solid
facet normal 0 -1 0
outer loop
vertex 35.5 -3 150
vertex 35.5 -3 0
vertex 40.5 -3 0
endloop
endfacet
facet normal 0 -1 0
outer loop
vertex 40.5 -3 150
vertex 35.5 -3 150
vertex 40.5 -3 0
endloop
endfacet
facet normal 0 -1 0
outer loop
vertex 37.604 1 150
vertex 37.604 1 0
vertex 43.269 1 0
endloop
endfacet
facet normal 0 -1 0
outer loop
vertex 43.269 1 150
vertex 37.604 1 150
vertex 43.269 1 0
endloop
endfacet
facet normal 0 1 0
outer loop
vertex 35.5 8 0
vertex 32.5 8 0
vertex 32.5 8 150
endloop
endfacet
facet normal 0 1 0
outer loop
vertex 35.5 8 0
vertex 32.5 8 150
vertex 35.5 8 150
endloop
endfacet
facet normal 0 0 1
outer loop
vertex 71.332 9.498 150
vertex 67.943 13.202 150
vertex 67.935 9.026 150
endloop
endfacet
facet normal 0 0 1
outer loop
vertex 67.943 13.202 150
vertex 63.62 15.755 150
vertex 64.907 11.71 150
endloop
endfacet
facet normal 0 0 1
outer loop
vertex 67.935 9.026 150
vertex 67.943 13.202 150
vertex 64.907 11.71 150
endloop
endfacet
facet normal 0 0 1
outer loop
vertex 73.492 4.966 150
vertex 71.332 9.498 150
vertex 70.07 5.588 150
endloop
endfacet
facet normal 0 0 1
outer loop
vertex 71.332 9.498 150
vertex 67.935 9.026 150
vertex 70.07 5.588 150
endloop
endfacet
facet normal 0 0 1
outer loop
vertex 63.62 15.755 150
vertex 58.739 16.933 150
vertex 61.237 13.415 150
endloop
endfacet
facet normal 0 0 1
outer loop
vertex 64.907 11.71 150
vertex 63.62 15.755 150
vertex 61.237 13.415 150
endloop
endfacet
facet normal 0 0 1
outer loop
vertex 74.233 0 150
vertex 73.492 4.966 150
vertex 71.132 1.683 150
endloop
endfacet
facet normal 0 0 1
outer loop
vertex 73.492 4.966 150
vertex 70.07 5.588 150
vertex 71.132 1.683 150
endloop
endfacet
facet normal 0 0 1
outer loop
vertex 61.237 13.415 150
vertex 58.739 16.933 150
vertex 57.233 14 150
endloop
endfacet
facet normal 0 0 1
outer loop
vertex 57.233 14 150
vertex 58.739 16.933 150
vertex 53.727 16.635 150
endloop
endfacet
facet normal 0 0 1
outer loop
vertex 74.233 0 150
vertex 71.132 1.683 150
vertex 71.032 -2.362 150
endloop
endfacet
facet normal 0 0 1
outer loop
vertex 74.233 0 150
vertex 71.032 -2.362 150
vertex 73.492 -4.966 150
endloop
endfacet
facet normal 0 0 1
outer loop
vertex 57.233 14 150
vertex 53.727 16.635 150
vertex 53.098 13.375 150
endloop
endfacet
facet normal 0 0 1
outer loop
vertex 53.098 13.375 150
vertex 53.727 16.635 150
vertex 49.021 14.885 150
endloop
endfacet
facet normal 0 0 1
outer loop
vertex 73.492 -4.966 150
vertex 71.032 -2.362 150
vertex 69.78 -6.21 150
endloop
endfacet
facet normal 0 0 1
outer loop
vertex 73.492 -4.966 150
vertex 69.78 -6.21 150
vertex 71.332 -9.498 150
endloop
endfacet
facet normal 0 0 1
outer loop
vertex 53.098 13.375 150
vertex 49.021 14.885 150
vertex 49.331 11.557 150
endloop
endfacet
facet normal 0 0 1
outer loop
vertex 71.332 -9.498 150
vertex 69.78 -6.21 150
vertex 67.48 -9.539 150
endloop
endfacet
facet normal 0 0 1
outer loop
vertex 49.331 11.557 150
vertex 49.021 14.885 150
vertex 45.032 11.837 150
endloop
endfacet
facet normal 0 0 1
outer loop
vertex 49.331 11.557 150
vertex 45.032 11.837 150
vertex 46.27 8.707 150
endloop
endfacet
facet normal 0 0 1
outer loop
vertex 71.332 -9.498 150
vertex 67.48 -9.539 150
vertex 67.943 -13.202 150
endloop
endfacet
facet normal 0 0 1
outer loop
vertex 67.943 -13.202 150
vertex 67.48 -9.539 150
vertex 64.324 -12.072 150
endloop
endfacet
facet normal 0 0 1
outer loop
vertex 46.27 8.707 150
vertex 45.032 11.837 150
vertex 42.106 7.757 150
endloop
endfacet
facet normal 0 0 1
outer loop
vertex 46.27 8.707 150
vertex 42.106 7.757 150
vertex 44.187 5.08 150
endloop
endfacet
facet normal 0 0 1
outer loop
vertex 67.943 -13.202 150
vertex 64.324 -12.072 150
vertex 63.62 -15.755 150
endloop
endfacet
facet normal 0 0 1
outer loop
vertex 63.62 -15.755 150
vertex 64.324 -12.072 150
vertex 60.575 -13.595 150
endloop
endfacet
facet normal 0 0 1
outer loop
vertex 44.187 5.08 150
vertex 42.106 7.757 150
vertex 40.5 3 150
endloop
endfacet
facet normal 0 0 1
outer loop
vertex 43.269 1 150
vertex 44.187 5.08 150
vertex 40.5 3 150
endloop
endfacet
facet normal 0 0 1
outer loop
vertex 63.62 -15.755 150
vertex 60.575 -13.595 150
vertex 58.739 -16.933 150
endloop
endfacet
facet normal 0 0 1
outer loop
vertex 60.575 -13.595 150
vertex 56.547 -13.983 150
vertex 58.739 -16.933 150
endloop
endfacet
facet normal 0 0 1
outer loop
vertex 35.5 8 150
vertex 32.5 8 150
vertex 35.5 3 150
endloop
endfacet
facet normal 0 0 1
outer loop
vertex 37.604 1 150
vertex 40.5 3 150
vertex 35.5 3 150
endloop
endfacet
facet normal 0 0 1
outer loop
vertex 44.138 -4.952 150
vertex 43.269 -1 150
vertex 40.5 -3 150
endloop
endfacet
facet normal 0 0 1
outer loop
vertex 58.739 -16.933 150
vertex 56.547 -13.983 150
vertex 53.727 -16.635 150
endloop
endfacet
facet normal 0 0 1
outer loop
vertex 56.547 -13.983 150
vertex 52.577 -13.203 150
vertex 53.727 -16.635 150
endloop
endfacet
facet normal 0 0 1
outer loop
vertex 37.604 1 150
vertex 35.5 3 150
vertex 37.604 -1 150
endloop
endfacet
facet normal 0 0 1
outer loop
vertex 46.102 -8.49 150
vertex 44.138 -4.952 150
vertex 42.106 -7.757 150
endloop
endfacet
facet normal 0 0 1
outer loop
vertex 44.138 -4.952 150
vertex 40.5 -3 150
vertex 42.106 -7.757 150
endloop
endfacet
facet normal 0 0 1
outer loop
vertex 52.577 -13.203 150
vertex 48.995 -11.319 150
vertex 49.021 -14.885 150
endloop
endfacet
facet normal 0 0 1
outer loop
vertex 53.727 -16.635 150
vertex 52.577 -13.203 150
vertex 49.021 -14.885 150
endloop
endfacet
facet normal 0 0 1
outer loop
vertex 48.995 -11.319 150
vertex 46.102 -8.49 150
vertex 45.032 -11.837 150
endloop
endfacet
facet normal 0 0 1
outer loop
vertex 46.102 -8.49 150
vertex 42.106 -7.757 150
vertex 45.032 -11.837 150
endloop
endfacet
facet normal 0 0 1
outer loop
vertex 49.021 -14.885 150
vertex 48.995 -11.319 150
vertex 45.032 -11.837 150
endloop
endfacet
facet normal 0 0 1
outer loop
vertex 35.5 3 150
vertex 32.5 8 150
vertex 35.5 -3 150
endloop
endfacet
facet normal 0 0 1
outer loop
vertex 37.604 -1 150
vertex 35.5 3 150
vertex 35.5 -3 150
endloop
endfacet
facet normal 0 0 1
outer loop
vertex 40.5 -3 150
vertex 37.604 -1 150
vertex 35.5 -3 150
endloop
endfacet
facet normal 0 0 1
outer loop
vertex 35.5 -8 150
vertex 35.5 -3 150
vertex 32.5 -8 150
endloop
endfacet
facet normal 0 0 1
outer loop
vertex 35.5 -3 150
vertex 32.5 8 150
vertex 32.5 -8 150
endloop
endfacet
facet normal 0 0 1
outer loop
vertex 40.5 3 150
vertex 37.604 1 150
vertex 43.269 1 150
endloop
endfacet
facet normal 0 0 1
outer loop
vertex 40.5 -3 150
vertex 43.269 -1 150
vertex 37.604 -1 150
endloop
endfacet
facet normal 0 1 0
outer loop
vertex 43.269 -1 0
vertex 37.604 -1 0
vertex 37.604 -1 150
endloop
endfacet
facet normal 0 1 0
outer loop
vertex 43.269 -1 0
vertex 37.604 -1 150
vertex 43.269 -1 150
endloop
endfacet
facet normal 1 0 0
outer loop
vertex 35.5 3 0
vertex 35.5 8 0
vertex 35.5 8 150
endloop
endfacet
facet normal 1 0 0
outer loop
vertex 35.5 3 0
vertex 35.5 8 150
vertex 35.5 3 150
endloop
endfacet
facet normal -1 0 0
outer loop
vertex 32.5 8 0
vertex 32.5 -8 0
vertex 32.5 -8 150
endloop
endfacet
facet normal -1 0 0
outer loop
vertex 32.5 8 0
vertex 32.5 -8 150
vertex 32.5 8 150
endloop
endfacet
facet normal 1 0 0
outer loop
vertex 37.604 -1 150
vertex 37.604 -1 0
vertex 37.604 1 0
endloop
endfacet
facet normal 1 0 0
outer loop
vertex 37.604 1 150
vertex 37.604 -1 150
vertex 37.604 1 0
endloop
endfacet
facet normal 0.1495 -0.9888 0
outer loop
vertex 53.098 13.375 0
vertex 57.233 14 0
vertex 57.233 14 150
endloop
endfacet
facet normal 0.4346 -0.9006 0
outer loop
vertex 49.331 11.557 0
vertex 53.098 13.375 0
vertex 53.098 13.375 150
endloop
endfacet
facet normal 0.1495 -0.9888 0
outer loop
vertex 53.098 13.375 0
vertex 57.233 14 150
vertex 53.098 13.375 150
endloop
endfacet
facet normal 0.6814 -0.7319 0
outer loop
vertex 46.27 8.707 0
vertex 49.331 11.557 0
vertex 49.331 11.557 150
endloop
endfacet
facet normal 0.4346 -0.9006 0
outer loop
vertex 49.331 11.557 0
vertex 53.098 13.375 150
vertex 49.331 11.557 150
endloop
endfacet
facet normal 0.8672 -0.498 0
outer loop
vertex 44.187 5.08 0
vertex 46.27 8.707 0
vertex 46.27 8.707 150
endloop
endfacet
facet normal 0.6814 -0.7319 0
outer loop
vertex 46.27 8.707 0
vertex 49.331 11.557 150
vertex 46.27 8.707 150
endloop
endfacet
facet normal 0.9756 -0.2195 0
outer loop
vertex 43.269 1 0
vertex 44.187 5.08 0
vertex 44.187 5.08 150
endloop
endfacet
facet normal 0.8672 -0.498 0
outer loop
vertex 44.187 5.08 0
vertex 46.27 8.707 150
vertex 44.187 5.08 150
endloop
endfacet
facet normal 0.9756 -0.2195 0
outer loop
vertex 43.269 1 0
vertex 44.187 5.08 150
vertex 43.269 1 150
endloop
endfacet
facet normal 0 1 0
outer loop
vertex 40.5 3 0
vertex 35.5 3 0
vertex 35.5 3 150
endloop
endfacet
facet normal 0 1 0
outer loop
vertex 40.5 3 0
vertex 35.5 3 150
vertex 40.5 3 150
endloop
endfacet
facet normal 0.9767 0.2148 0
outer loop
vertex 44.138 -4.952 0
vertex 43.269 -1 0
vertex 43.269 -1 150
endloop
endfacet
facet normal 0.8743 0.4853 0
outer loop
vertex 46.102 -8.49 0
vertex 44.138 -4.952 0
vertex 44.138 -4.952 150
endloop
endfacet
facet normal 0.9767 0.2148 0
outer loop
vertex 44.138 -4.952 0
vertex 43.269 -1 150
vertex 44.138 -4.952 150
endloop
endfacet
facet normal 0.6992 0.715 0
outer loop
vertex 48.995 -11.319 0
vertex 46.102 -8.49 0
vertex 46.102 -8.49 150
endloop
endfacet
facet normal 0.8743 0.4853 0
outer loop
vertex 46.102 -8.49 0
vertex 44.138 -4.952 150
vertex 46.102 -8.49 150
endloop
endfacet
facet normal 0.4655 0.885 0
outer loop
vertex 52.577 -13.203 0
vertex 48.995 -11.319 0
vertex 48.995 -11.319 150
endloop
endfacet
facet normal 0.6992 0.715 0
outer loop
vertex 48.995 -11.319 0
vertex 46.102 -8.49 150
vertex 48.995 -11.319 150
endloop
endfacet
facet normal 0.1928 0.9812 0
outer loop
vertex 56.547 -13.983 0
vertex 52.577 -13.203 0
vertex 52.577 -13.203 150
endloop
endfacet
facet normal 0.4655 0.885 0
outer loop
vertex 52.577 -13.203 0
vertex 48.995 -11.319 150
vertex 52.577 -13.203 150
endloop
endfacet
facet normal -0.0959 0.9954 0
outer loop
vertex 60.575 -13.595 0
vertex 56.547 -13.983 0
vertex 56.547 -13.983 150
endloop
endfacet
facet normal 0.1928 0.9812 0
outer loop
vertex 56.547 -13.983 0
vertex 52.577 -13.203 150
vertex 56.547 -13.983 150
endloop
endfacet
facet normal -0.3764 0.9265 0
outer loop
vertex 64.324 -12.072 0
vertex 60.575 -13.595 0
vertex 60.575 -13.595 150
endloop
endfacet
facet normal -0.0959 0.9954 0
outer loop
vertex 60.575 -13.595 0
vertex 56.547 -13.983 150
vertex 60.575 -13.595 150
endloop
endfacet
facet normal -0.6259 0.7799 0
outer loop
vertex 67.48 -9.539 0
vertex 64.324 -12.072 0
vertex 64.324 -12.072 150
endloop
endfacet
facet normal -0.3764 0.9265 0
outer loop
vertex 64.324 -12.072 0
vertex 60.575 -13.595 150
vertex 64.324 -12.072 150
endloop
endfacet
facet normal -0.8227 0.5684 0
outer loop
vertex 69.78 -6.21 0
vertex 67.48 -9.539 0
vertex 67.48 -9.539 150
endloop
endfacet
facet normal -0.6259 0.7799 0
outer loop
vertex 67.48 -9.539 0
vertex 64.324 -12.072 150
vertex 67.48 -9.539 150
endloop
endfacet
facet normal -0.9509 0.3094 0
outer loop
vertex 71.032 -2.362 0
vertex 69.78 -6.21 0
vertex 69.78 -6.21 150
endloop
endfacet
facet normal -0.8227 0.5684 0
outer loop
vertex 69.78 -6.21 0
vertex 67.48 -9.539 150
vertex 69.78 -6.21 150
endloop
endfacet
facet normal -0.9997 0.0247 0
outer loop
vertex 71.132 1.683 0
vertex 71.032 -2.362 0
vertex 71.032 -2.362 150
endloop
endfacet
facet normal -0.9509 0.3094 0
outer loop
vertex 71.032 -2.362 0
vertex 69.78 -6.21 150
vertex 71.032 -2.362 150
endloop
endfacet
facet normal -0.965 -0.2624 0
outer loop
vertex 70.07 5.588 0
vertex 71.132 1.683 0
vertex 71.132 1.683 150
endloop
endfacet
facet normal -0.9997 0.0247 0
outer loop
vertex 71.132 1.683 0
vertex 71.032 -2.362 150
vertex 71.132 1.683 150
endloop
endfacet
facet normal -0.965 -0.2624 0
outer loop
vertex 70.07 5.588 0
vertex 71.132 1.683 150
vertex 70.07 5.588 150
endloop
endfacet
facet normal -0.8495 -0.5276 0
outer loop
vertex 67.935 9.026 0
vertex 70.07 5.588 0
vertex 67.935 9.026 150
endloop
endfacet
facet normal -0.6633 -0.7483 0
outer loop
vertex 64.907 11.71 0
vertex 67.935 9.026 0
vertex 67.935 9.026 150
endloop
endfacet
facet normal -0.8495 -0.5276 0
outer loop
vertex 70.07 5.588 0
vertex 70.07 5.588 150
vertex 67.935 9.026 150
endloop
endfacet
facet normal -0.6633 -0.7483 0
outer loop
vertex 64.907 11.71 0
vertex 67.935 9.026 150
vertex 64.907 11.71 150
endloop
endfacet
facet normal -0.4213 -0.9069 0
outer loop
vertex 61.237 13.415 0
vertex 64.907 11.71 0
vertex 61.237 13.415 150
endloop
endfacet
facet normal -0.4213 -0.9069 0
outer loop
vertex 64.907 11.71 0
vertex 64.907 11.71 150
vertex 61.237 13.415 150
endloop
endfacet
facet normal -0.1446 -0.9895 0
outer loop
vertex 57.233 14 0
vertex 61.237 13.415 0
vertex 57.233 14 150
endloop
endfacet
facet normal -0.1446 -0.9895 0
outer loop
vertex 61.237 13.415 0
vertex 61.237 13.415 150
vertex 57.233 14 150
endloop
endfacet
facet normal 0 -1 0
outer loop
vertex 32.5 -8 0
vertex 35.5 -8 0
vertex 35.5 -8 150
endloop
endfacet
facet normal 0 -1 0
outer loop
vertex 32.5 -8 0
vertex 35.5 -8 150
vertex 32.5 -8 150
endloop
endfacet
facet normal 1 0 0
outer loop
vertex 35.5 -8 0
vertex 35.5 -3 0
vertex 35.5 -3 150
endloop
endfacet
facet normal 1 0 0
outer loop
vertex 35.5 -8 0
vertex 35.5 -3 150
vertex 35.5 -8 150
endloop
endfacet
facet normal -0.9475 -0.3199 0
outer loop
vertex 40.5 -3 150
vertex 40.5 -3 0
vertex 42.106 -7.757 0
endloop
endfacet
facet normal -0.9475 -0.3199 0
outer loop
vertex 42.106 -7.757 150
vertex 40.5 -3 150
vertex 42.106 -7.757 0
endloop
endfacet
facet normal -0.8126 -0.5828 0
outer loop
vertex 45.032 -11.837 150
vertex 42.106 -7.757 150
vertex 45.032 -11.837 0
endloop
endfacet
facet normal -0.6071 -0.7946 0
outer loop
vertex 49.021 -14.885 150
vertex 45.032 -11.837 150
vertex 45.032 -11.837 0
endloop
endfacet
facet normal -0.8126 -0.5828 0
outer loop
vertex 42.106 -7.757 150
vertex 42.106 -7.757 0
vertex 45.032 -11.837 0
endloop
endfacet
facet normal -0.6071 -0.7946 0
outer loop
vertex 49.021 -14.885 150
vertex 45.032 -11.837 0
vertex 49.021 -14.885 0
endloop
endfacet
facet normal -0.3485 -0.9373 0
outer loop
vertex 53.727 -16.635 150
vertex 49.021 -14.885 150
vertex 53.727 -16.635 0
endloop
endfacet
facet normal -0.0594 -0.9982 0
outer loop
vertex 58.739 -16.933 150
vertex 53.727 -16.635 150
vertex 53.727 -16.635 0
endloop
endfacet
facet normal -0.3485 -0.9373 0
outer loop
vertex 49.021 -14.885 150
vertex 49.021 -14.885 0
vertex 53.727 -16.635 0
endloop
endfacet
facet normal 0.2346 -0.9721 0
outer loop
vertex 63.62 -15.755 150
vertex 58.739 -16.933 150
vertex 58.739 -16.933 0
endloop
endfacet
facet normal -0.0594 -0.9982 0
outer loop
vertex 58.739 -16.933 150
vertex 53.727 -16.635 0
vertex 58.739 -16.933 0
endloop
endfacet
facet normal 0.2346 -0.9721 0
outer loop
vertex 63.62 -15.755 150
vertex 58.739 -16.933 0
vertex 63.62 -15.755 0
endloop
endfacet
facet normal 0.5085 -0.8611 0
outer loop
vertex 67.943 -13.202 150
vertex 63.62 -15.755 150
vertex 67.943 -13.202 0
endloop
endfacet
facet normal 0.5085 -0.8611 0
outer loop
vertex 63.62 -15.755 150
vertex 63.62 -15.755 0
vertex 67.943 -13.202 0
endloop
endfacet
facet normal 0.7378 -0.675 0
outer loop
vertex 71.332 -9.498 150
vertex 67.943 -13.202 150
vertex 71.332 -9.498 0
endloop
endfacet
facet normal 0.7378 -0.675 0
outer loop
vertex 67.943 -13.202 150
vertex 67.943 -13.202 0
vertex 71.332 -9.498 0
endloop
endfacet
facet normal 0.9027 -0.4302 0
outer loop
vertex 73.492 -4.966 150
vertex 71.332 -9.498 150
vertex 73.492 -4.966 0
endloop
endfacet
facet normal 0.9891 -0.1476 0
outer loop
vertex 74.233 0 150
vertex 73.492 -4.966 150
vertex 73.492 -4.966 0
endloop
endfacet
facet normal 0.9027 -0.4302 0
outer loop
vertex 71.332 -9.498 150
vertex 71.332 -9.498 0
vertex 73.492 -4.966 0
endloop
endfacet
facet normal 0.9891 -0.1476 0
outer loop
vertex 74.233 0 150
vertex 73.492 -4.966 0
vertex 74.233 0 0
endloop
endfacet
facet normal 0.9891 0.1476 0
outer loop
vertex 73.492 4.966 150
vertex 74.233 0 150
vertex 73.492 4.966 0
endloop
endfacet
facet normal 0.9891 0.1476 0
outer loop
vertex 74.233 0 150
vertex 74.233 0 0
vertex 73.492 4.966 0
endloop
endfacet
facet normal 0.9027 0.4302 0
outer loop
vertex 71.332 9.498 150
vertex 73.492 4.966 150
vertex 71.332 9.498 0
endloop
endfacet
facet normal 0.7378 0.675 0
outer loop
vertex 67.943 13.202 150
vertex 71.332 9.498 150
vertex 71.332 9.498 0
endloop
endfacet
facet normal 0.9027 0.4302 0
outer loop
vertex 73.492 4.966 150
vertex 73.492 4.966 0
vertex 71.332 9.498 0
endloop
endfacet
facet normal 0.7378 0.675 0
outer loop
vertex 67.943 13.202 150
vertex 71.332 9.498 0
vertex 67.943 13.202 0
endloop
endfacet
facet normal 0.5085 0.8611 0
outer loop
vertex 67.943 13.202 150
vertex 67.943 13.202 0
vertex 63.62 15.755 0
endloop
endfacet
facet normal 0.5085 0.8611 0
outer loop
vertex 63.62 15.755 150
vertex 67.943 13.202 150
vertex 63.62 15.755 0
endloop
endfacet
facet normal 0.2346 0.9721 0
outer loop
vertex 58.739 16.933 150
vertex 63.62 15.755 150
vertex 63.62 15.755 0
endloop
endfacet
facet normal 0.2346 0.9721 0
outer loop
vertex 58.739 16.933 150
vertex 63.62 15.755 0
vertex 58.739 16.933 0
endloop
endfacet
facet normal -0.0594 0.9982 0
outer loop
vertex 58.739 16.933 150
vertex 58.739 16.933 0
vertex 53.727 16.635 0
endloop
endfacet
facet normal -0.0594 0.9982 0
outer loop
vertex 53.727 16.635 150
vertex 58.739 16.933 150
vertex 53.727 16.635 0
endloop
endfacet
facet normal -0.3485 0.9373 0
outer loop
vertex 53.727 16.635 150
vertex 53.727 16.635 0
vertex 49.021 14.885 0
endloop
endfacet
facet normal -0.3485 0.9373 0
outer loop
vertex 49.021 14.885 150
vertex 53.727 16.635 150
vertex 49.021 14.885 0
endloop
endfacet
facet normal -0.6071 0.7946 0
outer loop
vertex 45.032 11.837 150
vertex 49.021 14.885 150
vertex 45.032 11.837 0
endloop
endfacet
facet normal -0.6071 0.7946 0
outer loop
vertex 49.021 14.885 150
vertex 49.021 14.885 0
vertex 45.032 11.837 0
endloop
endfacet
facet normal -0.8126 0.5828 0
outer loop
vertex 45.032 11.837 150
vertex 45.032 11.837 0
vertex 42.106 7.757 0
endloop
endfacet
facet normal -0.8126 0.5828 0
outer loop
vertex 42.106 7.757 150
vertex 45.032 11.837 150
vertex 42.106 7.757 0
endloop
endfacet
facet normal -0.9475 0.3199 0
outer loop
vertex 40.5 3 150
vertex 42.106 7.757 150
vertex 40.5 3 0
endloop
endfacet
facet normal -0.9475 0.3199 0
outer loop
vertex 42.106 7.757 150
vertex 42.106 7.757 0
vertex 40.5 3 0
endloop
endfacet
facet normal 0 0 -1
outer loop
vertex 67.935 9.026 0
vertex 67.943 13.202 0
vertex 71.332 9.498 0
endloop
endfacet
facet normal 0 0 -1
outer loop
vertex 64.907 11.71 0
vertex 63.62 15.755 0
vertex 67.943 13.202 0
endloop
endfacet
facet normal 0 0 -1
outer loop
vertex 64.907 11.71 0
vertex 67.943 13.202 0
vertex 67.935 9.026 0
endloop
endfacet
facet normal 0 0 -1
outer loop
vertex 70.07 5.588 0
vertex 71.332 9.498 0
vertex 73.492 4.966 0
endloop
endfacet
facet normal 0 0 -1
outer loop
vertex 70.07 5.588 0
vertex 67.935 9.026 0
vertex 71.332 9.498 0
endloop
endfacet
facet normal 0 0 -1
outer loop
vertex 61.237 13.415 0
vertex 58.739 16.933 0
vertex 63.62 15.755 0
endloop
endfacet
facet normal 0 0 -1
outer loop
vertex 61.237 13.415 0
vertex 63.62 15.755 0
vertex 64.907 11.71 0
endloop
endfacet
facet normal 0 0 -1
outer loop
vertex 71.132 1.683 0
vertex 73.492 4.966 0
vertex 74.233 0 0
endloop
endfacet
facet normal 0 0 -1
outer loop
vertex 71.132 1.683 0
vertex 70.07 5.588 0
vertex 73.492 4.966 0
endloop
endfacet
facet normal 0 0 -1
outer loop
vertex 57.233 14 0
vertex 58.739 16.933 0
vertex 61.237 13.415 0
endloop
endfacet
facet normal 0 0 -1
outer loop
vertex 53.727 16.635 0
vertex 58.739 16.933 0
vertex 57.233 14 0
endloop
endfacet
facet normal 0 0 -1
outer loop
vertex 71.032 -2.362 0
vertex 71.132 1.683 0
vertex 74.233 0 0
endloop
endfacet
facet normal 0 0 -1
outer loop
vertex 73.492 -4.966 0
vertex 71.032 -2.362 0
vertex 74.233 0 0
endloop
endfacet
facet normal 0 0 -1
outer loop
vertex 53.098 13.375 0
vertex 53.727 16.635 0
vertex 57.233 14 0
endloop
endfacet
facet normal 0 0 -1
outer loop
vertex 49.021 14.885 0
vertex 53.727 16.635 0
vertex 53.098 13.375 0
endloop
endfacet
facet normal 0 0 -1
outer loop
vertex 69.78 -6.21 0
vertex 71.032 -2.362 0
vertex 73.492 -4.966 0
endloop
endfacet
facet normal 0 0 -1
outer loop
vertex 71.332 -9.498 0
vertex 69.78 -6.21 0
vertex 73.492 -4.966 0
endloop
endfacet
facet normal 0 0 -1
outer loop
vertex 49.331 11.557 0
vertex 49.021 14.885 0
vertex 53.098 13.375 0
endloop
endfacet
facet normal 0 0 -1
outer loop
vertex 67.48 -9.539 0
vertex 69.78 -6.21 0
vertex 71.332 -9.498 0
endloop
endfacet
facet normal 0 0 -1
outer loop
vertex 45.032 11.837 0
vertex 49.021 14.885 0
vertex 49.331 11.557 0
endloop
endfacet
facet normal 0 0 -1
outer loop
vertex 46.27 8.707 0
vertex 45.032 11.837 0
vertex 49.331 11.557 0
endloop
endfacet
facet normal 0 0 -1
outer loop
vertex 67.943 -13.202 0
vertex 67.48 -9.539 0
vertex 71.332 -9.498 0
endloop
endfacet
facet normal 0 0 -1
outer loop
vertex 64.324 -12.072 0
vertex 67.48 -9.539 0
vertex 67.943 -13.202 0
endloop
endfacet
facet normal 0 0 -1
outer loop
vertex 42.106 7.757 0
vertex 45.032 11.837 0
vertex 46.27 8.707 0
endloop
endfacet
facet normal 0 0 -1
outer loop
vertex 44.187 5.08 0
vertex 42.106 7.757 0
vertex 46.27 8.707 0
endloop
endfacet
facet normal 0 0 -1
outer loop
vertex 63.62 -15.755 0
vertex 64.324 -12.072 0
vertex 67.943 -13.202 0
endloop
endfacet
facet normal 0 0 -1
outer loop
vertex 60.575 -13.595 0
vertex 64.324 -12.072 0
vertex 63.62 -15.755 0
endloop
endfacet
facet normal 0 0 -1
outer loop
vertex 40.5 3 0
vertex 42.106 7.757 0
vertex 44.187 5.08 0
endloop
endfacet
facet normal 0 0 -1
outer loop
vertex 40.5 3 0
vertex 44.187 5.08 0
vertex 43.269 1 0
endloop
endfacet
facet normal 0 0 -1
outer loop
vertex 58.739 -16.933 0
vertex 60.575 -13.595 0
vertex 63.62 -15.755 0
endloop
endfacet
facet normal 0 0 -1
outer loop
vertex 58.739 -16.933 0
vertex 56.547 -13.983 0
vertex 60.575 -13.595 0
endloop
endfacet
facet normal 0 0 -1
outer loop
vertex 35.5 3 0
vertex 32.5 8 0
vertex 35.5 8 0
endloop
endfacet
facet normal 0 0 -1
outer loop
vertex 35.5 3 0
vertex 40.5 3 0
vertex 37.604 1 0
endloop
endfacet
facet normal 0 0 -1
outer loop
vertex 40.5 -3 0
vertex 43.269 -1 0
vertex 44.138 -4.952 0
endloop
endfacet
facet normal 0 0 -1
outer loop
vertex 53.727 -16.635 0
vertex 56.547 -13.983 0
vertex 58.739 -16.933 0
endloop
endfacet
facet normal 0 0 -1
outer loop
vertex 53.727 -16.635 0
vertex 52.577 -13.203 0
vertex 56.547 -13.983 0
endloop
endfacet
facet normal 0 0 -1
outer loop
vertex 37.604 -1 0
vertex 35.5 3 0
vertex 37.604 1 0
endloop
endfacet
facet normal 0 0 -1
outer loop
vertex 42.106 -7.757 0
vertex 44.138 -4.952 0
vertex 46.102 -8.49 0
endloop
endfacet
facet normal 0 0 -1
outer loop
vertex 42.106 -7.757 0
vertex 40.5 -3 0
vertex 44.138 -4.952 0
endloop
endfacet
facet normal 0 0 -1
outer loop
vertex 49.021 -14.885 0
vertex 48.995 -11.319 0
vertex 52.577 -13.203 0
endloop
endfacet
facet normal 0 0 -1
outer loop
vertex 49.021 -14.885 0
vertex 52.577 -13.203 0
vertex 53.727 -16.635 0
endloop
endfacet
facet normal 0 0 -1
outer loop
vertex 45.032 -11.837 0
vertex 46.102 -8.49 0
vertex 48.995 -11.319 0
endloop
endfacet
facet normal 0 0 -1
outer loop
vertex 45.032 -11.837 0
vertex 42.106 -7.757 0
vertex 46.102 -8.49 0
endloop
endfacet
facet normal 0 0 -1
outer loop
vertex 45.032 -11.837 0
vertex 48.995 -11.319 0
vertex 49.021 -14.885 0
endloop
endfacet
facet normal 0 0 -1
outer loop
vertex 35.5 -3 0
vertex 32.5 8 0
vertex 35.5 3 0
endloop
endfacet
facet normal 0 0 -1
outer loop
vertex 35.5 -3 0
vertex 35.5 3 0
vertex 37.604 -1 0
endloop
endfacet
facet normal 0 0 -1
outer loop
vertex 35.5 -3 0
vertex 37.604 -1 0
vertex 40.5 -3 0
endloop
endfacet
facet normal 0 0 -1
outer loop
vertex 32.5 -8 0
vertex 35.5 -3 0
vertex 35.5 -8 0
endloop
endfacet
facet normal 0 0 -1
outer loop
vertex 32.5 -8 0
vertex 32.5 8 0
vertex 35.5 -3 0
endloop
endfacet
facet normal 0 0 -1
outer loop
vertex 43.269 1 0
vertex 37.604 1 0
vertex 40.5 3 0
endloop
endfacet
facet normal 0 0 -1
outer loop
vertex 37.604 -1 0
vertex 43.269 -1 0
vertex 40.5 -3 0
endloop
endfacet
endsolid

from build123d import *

# Parameters (mm, degrees)
PAD005_DEPTH            = 150
SKETCH013_R             = 14
POCKET005_DEPTH         = 150.001
SKETCH028_W             = 2
SKETCH028_H             = 10
POCKET010_DEPTH         = 150.001
BODY002_PLACEMENT_ANGLE = 90


with BuildPart() as part:
    # Sketch012 → Pad005 (new body)
    with BuildSketch(Plane.XY):
        with BuildLine():
            Line((-3, -3), (-8, -3))
            Line((-8, -3), (-8, 0))
            Line((-8, 0), (8, 0))
            Line((8, 0), (8, -3))
            Line((8, -3), (3, -3))
            Line((3, -3), (3, -8))
            ThreePointArc((-3, -8), (0, -41.733201), (3, -8))
            Line((-3, -3), (-3, -8))
        make_face()
    extrude(amount=PAD005_DEPTH)

    # Sketch013 (on Face10 of Pad005) → Pocket005 (cut, through all)
    with BuildSketch(Plane.XY.offset(150)):
        with Locations((0, -24.733201)):
            Circle(SKETCH013_R)
    extrude(amount=-POCKET005_DEPTH, mode=Mode.SUBTRACT)

    # Sketch028 (on Face4 of Pocket005) → Pocket010 (cut, through all)
    with BuildSketch(Plane(origin=(0, 0, 0), x_dir=(1, 0, 0), z_dir=(0, 0, -1))):
        with Locations((0, 10.103582)):
            Rectangle(SKETCH028_W, SKETCH028_H)
    extrude(amount=-POCKET010_DEPTH, mode=Mode.SUBTRACT)


with BuildPart() as part_1:
    # Body002 placement: moved
    add(part.part.moved(Location((32.5, 0, 0))).rotate(Axis((32.5, 0, 0), (0, 0, 1)), BODY002_PLACEMENT_ANGLE))


solid = part_1.part
